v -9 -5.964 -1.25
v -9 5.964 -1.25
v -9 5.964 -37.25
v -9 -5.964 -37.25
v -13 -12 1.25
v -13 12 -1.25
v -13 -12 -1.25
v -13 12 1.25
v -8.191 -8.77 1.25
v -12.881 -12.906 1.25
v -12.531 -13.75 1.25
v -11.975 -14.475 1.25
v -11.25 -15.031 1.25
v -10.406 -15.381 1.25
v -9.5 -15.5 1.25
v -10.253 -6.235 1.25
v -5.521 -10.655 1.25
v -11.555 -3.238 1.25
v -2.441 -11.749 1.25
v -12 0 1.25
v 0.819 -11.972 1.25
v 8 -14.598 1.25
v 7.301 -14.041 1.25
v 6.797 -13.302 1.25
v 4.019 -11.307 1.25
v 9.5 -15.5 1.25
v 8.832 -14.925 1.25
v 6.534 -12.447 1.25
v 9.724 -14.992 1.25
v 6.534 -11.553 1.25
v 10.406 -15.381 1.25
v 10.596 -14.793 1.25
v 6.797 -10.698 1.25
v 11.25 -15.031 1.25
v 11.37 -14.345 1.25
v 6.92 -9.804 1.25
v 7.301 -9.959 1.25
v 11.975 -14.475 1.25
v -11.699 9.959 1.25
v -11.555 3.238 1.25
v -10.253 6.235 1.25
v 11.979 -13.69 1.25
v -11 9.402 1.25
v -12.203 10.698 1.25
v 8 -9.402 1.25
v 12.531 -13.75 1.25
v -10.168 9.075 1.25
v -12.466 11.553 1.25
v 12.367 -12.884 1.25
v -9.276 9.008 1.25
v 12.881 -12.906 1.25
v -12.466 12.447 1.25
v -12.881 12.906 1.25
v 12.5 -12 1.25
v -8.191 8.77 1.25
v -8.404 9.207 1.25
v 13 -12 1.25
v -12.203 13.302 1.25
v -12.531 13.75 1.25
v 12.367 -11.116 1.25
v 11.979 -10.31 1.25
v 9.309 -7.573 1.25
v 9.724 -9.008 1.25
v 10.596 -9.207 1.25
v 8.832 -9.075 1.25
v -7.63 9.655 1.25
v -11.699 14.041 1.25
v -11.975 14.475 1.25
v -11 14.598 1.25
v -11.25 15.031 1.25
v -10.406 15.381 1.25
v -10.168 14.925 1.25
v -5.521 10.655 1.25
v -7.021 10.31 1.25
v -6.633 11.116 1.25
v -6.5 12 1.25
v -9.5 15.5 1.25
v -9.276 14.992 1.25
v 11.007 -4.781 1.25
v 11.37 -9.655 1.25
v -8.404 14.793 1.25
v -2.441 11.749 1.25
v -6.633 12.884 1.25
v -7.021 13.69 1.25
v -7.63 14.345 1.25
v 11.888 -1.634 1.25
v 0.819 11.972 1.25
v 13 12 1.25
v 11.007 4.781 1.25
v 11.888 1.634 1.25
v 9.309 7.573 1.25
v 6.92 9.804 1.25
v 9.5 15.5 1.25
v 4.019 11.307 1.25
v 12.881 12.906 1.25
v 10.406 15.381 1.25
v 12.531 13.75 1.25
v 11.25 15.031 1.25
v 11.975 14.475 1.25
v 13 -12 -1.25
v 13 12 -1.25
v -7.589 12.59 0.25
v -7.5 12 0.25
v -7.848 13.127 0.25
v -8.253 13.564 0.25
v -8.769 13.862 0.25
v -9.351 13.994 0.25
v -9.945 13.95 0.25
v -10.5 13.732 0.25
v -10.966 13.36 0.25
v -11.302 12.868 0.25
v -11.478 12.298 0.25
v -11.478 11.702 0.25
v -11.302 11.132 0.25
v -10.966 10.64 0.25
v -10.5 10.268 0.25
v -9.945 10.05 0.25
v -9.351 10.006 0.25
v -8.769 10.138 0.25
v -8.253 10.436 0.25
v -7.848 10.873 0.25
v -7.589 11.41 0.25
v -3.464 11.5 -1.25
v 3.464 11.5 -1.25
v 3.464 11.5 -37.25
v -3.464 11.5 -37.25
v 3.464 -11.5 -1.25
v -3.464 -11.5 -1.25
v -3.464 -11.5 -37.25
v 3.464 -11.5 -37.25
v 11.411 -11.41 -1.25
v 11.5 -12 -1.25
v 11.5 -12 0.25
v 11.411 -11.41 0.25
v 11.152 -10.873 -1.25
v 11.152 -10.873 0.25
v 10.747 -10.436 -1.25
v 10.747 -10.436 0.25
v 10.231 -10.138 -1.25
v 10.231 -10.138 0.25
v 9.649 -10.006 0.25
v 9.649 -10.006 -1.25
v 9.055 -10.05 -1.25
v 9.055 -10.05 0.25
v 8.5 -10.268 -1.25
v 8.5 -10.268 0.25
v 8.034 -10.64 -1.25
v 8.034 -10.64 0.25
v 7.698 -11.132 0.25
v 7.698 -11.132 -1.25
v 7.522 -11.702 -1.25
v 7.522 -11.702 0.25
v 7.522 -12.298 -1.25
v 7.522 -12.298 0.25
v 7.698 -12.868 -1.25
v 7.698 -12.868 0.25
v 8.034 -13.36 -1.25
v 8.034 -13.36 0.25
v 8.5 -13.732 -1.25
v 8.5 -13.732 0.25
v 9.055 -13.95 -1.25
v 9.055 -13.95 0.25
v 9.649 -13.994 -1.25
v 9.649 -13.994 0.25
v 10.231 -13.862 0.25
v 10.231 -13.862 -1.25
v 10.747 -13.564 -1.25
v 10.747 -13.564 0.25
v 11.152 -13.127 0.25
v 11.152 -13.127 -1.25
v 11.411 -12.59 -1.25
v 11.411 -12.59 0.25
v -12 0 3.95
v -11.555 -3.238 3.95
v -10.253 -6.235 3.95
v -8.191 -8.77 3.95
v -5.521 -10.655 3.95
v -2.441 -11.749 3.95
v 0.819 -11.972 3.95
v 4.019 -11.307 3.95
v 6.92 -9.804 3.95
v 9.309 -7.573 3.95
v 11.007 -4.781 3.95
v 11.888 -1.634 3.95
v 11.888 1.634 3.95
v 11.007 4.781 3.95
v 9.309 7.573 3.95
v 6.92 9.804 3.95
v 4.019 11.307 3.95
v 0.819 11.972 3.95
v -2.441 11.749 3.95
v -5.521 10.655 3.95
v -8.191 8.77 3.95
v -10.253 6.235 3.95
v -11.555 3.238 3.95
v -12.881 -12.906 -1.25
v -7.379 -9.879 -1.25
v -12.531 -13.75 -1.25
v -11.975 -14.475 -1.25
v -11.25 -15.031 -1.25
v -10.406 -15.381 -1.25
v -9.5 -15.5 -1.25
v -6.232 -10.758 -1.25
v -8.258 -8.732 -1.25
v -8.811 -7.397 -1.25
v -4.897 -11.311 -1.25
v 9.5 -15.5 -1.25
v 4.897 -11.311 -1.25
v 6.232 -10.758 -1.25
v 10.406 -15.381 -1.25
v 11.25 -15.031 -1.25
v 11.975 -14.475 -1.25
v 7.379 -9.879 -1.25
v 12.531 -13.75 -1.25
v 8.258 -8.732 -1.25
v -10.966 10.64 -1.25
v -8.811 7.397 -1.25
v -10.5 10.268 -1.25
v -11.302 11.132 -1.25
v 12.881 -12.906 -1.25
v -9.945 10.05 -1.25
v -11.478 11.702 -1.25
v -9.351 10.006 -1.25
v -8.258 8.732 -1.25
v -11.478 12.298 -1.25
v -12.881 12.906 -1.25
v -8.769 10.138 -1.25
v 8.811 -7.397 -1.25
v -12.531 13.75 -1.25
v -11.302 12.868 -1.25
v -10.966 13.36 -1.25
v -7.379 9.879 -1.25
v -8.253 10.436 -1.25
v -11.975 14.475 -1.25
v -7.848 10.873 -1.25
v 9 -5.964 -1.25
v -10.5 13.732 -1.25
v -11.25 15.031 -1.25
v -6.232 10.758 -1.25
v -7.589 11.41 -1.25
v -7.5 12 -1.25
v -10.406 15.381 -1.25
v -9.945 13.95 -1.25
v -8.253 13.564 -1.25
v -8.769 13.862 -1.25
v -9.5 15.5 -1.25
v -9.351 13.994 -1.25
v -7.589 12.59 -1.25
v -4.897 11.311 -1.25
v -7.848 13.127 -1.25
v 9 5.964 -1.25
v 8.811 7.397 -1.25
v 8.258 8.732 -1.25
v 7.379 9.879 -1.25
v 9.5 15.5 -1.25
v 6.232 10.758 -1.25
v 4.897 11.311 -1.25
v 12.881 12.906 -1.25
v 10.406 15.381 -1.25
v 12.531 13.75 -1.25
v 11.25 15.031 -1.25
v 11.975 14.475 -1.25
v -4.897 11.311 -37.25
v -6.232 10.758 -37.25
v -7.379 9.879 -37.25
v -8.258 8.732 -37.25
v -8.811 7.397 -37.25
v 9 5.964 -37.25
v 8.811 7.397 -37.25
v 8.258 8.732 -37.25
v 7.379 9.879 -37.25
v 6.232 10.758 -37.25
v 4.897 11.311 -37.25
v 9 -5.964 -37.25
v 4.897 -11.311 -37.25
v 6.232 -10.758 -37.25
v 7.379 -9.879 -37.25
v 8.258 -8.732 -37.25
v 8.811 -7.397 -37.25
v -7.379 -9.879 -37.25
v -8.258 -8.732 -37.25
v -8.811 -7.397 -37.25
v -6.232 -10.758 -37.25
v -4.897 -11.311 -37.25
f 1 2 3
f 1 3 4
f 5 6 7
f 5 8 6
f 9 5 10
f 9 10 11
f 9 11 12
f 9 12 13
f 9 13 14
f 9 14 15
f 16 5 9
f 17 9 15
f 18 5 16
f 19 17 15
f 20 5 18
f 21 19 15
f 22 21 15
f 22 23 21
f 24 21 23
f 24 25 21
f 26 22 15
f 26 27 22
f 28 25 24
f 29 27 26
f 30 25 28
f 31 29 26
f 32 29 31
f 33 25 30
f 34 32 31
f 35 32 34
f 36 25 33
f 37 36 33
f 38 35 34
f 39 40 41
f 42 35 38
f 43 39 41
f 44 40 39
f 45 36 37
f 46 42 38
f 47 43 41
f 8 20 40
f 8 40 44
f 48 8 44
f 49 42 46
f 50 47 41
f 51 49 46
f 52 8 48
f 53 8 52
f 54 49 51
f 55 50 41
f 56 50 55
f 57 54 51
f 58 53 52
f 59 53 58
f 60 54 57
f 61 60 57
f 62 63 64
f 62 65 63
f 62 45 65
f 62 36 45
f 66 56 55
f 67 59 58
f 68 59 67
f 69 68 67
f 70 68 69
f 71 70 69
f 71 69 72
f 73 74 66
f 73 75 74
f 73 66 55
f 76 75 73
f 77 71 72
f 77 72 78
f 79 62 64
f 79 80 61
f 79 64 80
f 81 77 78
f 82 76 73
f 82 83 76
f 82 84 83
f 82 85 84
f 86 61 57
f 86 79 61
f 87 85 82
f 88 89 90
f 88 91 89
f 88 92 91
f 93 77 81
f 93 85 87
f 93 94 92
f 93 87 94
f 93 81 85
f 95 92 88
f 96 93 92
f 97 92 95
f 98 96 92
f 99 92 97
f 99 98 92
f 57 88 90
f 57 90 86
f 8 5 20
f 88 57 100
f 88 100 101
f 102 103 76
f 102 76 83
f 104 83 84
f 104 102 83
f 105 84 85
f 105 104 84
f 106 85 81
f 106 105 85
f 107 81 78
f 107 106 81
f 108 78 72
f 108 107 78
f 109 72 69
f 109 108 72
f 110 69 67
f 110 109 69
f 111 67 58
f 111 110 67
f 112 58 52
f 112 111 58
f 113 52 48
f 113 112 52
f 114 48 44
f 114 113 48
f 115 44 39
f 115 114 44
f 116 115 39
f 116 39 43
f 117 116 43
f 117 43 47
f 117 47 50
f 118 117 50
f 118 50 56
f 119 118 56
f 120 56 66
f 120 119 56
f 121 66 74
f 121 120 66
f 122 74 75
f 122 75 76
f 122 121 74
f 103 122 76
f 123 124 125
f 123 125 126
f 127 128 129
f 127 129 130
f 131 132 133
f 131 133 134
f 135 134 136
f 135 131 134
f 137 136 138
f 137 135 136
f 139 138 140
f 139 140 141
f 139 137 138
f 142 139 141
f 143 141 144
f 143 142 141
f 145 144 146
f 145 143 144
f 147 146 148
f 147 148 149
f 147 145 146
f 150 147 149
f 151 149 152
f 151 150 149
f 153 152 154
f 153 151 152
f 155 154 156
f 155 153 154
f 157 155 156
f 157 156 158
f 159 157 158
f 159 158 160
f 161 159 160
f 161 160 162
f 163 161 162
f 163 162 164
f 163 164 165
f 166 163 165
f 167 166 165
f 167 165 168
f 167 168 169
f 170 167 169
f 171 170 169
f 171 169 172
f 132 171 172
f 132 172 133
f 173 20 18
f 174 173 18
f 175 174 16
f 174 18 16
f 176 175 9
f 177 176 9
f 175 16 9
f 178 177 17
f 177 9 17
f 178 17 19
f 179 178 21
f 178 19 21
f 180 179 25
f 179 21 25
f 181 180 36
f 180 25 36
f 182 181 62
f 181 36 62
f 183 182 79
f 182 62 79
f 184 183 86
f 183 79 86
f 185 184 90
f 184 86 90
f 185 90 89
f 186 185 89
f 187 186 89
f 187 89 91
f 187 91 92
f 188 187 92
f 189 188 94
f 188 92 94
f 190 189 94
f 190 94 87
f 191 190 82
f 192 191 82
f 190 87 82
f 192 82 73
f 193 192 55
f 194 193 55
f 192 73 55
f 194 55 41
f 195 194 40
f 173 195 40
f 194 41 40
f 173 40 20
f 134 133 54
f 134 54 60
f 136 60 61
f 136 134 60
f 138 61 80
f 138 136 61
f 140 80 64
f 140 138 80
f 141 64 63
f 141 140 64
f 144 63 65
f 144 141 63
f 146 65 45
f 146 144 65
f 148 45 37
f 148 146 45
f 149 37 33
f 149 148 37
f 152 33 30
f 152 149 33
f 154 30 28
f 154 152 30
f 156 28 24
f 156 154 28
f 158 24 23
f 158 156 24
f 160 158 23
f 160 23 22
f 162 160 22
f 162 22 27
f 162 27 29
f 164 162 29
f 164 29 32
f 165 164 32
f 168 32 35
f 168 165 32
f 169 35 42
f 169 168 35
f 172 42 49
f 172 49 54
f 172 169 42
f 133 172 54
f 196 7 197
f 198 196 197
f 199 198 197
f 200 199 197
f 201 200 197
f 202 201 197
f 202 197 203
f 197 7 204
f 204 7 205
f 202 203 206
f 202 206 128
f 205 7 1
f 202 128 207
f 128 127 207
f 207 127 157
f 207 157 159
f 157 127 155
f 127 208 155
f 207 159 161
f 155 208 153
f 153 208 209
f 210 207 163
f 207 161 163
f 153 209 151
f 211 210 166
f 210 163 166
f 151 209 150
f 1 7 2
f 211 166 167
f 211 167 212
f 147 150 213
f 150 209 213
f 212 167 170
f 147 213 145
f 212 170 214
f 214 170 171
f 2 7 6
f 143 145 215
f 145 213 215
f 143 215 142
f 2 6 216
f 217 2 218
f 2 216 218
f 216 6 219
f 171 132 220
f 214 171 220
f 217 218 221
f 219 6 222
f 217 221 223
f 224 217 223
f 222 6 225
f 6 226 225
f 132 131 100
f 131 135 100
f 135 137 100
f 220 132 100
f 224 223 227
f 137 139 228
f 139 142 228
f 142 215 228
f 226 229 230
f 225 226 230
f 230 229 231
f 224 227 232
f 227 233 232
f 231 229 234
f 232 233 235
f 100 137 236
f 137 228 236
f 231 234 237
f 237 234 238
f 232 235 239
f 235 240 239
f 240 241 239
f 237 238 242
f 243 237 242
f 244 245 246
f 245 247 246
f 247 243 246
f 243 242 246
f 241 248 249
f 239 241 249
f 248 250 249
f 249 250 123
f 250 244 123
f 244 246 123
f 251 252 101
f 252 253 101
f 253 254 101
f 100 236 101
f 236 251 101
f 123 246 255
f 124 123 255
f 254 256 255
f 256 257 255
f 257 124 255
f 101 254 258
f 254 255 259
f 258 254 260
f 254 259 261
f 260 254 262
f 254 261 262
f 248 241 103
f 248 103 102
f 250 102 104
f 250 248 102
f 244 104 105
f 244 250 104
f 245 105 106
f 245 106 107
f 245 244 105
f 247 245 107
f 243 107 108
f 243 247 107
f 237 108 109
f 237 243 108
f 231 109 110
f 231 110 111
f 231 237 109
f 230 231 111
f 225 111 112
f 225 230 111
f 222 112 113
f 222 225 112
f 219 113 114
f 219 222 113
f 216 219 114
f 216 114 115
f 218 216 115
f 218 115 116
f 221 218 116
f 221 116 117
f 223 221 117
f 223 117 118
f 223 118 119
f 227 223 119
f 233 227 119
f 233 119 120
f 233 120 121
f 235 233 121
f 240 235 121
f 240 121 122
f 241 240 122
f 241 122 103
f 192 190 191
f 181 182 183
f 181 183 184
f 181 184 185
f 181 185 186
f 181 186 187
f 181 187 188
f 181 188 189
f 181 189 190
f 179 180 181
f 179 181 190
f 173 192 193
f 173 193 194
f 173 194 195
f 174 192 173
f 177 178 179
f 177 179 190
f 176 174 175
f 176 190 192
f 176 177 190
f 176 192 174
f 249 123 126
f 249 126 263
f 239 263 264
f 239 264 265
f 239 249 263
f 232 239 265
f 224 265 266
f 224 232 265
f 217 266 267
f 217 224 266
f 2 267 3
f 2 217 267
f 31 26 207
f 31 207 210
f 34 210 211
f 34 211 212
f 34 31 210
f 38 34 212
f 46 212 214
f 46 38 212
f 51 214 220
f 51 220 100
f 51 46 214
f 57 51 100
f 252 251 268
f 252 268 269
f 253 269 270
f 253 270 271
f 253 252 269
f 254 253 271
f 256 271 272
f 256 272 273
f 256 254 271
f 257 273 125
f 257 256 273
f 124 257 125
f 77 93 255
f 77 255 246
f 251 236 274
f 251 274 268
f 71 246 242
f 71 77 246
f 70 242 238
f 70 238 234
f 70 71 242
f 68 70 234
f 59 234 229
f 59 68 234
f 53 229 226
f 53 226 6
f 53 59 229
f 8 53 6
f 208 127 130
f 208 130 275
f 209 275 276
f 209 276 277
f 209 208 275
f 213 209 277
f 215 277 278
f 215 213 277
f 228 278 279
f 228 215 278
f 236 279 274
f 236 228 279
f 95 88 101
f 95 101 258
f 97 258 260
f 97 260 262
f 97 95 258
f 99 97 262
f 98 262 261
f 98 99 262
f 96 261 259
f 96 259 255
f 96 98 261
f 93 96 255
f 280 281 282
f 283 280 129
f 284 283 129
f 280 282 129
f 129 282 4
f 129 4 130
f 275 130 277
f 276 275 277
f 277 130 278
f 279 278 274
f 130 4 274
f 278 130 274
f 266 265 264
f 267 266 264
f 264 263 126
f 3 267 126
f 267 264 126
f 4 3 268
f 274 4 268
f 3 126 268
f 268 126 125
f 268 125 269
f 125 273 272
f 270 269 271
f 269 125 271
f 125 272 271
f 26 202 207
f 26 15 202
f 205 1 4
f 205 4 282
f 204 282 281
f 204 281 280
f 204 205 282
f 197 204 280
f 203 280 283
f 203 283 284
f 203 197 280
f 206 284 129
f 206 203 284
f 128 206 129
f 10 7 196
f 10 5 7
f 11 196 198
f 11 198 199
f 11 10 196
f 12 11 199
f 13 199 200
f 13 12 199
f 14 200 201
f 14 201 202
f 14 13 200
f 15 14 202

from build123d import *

# Parameters (mm, degrees)
SKETCH1_R           = 2
BOSS_EXTRUDE1_DEPTH = 1.25
BOSS_EXTRUDE2_START = 1.25
SKETCH1_3_R         = 12
BOSS_EXTRUDE2_DEPTH = 2.7
BOSS_EXTRUDE3_START = -1.25
BOSS_EXTRUDE3_DEPTH = 36
CHAMFER1_SIZE       = 1


with BuildPart() as part:
    # Sketch1 → Boss-Extrude1 (new, symmetric)
    with BuildSketch(Plane.XY):
        with BuildLine():
            Line((-9.5, -15.5), (9.5, -15.5))
            ThreePointArc((9.5, -15.5), (11.974873734, -14.474873734), (13, -12))
            Line((13, -12), (13, 12))
            ThreePointArc((13, 12), (11.974873734, 14.474873734), (9.5, 15.5))
            Line((9.5, 15.5), (-9.5, 15.5))
            ThreePointArc((-9.5, 15.5), (-11.974873734, 14.474873734), (-13, 12))
            Line((-13, 12), (-13, -12))
            ThreePointArc((-13, -12), (-11.974873734, -14.474873734), (-9.5, -15.5))
        make_face()
        with Locations((-9.5, 12)):
            Circle(SKETCH1_R, mode=Mode.SUBTRACT)
        with Locations((9.5, -12)):
            Circle(SKETCH1_R, mode=Mode.SUBTRACT)
    extrude(amount=BOSS_EXTRUDE1_DEPTH, both=True)

    # Sketch1<3> → Boss-Extrude2 (add)
    with BuildSketch(Plane.XY.offset(BOSS_EXTRUDE2_START)):
        with Locations(Location((0, 0, 0), (0, 0, 180))):
            Circle(SKETCH1_3_R)
    extrude(amount=BOSS_EXTRUDE2_DEPTH)

    # Sketch1<4> → Boss-Extrude3 (add)
    with BuildSketch(Plane.XY.offset(BOSS_EXTRUDE3_START)):
        with BuildLine():
            Line((-3.464466094, -11.5), (3.464466094, -11.5))
            ThreePointArc((3.464466094, -11.5), (7.378679656, -9.878679656), (9, -5.964466094))
            Line((9, -5.964466094), (9, 5.964466094))
            ThreePointArc((9, 5.964466094), (7.378679656, 9.878679656), (3.464466094, 11.5))
            Line((3.464466094, 11.5), (-3.464466094, 11.5))
            ThreePointArc((-3.464466094, 11.5), (-7.378679656, 9.878679656), (-9, 5.964466094))
            Line((-9, 5.964466094), (-9, -5.964466094))
            ThreePointArc((-9, -5.964466094), (-7.378679656, -9.878679656), (-3.464466094, -11.5))
        make_face()
    extrude(amount=-BOSS_EXTRUDE3_DEPTH)

    # Chamfer1
    chamfer1_edges = [part.edges().sort_by_distance(p)[0] for p in [
        (7.5, -12, 1.25),
        (-11.5, 12, 1.25),
    ]]
    chamfer(chamfer1_edges, length=CHAMFER1_SIZE)


solid = part.part
